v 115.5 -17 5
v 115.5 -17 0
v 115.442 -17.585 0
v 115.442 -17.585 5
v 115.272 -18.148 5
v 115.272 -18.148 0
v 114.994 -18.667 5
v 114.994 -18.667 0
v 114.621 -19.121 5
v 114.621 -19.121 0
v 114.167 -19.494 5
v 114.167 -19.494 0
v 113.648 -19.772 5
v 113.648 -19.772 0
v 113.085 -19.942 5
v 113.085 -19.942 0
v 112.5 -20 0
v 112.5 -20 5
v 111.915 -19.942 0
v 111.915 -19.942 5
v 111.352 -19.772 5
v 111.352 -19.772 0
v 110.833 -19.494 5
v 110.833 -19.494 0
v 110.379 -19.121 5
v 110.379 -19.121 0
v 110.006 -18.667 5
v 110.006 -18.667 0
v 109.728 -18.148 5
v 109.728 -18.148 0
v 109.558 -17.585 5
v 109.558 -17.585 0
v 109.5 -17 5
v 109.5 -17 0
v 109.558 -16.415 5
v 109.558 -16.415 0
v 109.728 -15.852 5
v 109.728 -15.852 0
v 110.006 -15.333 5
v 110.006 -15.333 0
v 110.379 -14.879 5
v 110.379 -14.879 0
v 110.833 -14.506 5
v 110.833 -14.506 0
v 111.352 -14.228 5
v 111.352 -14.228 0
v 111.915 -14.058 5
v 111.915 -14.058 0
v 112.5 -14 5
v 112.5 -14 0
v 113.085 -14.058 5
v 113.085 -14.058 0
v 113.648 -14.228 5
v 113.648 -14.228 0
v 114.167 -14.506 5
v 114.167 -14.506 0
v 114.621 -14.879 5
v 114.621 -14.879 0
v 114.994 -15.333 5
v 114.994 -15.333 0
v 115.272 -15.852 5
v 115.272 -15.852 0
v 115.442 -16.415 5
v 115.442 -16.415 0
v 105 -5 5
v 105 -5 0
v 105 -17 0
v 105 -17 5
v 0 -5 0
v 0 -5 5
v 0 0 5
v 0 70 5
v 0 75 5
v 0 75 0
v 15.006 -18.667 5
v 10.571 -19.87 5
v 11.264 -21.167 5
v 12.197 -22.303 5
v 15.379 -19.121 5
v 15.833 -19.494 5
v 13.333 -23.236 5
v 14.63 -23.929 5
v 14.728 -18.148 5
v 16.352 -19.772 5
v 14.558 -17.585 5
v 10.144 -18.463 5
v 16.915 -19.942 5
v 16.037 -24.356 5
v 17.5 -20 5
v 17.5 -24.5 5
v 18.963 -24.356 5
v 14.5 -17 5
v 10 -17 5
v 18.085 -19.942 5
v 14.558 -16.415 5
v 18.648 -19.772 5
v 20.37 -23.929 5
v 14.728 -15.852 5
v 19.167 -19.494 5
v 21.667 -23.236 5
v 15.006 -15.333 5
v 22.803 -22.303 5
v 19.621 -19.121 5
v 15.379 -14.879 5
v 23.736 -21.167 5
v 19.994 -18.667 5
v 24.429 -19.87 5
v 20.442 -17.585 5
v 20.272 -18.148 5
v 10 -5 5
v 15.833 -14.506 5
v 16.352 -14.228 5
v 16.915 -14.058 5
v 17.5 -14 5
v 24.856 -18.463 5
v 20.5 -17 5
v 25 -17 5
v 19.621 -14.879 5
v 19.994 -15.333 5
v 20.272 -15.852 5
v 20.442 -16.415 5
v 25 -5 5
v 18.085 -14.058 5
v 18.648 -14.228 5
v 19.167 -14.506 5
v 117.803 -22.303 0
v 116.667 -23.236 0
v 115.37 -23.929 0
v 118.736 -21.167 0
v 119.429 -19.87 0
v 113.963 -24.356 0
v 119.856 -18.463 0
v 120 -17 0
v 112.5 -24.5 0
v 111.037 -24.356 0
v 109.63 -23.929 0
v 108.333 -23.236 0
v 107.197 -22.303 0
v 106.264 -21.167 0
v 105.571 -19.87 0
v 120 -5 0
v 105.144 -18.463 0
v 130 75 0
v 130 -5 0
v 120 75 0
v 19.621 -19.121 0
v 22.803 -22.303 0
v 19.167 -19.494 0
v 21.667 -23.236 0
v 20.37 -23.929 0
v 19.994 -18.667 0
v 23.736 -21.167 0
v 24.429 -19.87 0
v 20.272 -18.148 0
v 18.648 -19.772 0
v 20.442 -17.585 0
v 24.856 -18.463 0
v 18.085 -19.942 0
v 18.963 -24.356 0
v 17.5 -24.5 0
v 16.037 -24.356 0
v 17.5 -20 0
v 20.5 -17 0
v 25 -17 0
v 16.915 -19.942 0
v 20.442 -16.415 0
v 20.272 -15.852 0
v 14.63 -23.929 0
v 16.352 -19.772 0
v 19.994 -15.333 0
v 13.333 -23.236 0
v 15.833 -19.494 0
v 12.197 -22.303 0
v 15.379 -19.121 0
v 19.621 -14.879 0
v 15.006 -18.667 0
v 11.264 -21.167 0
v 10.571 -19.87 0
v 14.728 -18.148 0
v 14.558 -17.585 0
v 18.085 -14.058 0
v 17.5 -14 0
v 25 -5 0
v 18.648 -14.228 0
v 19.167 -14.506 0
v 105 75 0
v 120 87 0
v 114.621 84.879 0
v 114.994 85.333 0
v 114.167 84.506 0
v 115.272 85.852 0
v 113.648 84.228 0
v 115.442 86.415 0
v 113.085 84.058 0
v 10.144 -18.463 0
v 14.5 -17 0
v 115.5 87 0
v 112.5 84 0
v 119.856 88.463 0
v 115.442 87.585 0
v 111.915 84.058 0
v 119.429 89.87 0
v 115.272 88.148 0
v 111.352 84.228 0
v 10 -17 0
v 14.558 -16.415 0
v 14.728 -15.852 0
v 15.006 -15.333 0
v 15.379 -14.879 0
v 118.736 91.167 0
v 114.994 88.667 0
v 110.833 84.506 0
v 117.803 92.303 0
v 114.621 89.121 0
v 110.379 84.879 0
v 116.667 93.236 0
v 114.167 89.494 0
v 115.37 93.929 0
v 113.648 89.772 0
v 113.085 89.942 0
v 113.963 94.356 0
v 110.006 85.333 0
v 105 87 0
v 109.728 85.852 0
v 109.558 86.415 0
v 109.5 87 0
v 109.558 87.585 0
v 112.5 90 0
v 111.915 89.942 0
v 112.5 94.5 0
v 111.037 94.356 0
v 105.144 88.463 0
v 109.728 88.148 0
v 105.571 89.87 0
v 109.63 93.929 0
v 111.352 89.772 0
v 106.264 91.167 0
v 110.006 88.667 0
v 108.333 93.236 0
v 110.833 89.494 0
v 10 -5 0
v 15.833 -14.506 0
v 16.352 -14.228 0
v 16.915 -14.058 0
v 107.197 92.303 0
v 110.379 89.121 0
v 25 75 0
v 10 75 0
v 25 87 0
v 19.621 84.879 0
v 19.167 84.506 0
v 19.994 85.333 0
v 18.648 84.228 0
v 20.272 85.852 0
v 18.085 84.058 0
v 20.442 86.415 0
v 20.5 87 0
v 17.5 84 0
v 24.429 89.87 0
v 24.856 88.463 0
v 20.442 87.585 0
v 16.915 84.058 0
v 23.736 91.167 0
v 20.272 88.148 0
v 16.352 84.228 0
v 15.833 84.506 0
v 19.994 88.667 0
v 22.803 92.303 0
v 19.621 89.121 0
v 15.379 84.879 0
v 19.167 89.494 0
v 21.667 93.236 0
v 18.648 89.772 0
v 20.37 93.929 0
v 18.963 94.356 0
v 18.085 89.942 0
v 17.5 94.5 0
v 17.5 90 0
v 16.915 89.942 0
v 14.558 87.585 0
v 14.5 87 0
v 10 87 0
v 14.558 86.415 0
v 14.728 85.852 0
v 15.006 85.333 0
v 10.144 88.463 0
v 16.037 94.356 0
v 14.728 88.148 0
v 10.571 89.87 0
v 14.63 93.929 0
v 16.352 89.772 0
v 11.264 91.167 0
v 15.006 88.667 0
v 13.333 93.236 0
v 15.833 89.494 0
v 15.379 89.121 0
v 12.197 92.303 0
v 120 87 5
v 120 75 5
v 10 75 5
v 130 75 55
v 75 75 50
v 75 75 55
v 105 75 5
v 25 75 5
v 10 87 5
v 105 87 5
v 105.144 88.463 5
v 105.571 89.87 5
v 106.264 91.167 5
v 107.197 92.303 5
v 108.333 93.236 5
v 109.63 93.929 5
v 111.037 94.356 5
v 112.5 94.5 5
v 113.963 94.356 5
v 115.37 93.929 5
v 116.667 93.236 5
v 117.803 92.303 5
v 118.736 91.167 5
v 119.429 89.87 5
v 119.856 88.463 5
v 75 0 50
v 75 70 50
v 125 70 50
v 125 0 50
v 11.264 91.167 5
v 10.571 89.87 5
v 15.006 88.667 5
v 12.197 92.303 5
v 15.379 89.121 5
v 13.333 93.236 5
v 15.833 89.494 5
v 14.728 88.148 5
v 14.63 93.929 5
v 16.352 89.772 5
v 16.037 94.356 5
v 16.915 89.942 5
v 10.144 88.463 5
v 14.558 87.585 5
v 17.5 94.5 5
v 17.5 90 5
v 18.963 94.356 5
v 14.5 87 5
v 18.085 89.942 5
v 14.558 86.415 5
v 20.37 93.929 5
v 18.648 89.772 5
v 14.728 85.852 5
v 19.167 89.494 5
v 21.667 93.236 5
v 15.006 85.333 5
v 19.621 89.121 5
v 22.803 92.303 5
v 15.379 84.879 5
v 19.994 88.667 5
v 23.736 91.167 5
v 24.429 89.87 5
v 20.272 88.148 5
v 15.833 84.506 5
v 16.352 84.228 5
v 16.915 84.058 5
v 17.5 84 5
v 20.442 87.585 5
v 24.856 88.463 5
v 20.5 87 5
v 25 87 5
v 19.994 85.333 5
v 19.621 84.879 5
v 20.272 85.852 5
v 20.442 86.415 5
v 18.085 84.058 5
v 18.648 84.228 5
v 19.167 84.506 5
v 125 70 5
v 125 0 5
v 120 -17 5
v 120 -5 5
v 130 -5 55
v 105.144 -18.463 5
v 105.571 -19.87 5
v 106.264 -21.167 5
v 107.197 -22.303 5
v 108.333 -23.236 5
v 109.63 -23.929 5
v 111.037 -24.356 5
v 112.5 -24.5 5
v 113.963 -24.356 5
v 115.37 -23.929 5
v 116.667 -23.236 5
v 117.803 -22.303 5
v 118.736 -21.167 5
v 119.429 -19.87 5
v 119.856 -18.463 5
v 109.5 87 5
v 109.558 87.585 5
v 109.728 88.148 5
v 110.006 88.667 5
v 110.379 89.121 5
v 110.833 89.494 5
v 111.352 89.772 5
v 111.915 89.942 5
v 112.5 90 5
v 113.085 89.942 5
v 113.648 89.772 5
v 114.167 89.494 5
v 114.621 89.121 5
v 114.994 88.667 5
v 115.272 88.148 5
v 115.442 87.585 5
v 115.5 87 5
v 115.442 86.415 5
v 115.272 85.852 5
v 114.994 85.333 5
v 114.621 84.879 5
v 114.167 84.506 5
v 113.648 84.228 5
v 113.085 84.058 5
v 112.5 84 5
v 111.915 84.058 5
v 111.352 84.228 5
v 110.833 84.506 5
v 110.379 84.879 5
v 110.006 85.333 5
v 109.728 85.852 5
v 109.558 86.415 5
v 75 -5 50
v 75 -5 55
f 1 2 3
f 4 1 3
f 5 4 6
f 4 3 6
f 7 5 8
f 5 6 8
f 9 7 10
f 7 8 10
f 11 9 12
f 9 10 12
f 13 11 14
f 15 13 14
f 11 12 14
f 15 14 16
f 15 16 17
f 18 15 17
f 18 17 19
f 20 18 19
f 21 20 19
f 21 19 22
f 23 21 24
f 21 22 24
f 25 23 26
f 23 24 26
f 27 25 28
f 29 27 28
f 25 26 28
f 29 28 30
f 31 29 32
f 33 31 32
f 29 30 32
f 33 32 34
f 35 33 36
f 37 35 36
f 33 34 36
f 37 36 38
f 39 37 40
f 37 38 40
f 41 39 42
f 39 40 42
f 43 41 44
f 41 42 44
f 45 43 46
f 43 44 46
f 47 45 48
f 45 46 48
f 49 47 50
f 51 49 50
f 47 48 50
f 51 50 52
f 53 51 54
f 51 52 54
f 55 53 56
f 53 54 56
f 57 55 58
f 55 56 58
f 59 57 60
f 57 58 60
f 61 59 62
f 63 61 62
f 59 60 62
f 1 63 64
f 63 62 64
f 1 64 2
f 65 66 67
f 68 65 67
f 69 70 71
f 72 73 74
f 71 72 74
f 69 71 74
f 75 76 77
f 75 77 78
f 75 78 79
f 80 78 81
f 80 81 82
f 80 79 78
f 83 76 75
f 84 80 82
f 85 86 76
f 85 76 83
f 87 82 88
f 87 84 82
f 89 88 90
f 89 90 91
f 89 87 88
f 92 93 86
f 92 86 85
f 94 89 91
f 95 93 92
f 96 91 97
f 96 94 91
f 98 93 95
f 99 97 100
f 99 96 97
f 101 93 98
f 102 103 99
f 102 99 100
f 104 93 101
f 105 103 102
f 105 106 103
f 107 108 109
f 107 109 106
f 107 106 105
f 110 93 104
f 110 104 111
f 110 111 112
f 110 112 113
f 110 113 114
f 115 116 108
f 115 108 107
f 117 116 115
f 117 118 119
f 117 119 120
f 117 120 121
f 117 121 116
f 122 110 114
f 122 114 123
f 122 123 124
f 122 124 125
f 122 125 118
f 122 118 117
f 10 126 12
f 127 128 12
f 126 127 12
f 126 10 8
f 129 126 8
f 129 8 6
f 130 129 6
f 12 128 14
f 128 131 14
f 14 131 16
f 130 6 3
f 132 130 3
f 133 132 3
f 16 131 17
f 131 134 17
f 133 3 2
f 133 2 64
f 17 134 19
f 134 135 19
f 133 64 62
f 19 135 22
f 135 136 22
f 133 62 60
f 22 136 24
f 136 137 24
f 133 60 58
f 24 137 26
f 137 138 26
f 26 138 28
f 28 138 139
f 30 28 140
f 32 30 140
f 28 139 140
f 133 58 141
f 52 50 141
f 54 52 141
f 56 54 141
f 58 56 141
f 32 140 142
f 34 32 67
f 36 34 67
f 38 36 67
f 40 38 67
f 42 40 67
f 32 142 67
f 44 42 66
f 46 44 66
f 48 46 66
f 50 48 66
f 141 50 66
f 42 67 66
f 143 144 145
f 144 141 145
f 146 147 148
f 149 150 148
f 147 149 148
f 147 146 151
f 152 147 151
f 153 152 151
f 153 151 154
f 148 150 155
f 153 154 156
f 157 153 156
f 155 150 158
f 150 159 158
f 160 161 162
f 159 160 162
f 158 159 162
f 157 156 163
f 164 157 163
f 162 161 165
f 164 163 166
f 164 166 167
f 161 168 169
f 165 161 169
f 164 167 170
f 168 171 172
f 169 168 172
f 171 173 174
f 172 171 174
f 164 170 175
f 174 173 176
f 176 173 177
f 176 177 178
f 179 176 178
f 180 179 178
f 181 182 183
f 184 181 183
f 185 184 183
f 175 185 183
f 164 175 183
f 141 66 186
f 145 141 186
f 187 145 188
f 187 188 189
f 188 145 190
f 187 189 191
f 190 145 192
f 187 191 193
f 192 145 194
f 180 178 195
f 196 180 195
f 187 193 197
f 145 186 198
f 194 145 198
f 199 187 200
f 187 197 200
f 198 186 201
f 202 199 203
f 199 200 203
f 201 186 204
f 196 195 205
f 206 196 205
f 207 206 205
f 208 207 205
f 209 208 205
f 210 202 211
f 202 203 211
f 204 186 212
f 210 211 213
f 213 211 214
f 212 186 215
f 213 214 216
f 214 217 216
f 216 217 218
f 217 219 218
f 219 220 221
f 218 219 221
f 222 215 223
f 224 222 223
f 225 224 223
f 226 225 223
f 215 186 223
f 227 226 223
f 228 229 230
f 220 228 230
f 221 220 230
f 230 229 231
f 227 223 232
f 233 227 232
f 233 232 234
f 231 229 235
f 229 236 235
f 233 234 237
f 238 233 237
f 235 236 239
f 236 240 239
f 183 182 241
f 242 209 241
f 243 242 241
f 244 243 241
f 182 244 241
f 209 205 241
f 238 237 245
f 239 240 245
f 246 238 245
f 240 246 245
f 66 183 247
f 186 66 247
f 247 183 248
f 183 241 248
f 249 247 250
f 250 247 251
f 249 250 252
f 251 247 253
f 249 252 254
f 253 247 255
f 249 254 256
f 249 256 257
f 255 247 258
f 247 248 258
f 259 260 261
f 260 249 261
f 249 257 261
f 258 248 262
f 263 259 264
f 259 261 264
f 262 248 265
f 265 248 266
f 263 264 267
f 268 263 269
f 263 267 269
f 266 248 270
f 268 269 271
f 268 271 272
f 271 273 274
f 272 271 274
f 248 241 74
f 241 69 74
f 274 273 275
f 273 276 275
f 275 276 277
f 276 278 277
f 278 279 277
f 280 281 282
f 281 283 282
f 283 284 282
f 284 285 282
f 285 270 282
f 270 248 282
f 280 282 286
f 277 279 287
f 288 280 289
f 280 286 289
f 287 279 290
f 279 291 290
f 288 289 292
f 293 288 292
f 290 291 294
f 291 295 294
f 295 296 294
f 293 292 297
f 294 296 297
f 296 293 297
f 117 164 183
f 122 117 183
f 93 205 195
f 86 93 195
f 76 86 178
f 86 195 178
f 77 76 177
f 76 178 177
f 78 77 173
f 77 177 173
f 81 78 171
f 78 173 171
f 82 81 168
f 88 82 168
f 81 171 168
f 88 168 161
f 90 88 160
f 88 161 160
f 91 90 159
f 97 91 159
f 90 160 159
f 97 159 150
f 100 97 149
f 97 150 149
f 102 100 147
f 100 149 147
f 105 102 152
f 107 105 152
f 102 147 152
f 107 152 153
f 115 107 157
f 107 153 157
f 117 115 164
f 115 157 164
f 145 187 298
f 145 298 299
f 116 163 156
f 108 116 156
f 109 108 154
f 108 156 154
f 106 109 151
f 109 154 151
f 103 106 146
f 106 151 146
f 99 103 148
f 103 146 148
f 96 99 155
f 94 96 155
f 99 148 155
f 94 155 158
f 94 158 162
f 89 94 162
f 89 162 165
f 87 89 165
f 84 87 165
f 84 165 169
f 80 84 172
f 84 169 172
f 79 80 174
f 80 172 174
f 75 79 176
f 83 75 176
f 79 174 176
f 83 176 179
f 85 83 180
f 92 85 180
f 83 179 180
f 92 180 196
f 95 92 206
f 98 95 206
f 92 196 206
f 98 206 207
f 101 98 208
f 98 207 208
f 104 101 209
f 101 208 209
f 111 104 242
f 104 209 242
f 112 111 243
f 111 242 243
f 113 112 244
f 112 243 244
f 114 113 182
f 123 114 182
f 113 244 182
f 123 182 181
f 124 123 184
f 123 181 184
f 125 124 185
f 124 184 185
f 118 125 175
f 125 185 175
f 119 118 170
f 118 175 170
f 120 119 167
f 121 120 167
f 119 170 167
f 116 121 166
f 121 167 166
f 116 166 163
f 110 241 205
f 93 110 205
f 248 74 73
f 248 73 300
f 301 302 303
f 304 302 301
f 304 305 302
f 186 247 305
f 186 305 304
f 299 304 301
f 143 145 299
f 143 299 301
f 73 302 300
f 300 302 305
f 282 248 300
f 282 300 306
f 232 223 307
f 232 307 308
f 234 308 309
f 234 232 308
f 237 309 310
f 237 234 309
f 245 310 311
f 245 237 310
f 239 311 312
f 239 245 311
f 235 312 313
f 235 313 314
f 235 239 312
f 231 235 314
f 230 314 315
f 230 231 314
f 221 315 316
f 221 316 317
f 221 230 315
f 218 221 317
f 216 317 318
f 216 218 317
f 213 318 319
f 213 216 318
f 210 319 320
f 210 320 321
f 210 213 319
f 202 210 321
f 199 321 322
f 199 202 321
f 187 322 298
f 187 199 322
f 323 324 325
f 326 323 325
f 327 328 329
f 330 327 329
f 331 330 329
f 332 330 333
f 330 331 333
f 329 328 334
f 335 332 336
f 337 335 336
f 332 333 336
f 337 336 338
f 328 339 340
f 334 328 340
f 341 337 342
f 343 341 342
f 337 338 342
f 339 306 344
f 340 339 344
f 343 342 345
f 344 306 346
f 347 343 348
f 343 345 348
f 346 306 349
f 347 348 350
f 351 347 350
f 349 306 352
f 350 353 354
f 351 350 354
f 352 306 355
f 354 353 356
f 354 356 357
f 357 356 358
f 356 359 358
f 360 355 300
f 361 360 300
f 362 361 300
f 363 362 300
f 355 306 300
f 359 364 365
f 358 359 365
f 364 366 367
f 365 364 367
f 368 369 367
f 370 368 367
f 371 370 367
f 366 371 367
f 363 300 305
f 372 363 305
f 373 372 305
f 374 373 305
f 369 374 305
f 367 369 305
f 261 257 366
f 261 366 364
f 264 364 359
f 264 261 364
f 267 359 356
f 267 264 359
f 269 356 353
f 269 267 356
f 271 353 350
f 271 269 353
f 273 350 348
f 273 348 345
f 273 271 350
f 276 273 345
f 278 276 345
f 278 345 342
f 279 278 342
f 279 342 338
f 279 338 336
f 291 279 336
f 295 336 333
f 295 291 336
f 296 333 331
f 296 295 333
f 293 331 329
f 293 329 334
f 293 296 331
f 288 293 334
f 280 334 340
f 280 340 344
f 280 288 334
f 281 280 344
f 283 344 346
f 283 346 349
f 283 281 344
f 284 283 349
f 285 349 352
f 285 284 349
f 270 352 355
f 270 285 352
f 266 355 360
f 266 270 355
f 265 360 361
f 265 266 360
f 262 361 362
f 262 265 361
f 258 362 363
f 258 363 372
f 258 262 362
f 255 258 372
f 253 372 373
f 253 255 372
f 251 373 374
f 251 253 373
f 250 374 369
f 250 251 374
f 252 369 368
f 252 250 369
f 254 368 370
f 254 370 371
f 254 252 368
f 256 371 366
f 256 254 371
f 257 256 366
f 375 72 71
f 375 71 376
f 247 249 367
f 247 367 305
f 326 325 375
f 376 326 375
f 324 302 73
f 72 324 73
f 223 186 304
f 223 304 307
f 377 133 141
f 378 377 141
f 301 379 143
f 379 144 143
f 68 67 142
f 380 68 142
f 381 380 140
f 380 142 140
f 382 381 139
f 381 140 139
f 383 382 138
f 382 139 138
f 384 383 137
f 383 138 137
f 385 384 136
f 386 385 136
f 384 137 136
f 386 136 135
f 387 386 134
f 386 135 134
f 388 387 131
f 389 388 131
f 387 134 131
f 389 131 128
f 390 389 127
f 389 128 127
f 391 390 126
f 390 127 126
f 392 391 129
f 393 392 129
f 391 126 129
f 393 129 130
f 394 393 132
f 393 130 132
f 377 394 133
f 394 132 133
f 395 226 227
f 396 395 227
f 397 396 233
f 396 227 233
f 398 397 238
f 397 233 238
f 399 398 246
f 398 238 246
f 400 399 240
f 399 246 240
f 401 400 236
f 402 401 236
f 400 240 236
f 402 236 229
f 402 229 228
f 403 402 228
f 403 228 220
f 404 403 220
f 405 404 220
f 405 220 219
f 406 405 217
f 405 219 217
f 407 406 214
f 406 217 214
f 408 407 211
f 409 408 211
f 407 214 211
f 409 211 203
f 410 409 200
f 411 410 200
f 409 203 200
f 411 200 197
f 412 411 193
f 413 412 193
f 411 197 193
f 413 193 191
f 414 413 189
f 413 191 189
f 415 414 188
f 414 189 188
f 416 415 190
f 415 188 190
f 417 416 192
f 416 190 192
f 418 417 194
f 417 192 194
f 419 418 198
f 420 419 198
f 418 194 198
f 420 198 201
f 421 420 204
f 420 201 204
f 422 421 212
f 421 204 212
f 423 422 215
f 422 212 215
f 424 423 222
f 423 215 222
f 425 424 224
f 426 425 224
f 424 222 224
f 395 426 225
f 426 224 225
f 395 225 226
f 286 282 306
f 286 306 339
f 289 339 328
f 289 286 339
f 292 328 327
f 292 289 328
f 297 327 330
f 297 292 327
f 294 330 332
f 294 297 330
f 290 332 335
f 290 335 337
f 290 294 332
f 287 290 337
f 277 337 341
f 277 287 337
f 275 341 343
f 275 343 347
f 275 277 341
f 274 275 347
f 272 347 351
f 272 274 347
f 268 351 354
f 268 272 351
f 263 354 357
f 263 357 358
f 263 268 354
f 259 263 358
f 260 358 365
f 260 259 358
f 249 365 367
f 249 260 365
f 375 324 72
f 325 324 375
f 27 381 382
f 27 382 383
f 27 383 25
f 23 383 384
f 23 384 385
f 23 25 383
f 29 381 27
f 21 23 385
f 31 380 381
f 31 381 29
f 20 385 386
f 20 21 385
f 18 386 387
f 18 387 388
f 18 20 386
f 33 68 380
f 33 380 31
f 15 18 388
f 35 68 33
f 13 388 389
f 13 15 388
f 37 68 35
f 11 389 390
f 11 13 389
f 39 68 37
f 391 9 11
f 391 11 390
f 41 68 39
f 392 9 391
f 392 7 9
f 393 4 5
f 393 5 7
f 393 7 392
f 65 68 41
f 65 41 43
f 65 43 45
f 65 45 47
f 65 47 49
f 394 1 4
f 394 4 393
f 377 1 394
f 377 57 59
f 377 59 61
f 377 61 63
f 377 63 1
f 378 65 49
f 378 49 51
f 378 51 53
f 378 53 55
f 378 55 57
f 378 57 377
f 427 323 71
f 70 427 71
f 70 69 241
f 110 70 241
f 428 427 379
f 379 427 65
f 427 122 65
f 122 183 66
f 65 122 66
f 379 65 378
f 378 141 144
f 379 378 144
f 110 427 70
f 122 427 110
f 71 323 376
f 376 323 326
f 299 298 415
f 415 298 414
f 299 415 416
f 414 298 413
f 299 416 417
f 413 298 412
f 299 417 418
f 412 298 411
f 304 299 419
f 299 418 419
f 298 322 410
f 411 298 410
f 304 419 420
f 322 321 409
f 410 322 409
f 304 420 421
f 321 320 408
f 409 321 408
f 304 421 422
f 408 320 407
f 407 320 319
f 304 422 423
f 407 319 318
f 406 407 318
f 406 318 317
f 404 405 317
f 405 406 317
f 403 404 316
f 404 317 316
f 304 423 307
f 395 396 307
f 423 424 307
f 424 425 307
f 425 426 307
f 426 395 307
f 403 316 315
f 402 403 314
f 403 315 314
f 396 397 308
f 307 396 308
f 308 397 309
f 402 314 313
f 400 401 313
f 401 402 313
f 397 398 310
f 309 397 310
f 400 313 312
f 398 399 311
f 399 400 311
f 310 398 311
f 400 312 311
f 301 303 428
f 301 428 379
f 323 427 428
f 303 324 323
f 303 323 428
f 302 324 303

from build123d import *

# Parameters (mm, degrees)
SKETCH_1_W             = 125
SKETCH_1_H             = 70
EXTRUDE_1_DEPTH        = 5
EXTRUDE_2_DEPTH        = 5
PATTERN_LINEAR_1_COUNT = 2
PATTERN_LINEAR_1_PITCH = 75
SKETCH_4_W             = 50
SKETCH_4_H             = 80
EXTRUDE_3_DEPTH        = 5
SKETCH_5_W             = 55
SKETCH_5_H             = 80
EXTRUDE_4_DEPTH        = 5
EXTRUDE_5_DEPTH        = 5
PATTERN_LINEAR_2_COUNT = 2
PATTERN_LINEAR_2_PITCH = 95
MIRROR_1_COPY_1_DEPTH  = 5


with BuildPart() as part:
    # 草圖1 → 填料-伸長1 (new body)
    with BuildSketch(Plane.XY):
        with Locations((62.5, 35)):
            Rectangle(SKETCH_1_W, SKETCH_1_H)
    extrude(amount=EXTRUDE_1_DEPTH)

    # 草圖2 → 填料-伸長2 (add)
    with BuildSketch(Plane.XZ):
        Polygon((75, 50), (0, 5), (0, 0), (125, 0), (125, 50), align=None)
    extrude_2 = extrude(amount=EXTRUDE_2_DEPTH)

    # 直線複製排列1: 填料-伸長2 ×2
    with Locations(*[(0, i * PATTERN_LINEAR_1_PITCH, 0) for i in range(1, PATTERN_LINEAR_1_COUNT)]):
        add(extrude_2)

    # 草圖4 → 填料-伸長3 (add)
    with BuildSketch(Plane(origin=(125, 0, 0), x_dir=(0, 0, -1), z_dir=(1, 0, 0))):
        with Locations((-25, 35)):
            Rectangle(SKETCH_4_W, SKETCH_4_H)
    extrude(amount=EXTRUDE_3_DEPTH)

    # 草圖5 → 填料-伸長4 (add)
    with BuildSketch(Plane.XY.offset(50)):
        with Locations((102.5, 35)):
            Rectangle(SKETCH_5_W, SKETCH_5_H)
    extrude(amount=EXTRUDE_4_DEPTH)

    # 草圖6 → 填料-伸長5 (add)
    with BuildSketch(Plane.XY):
        with BuildLine():
            Line((25, -5), (10, -5))
            Line((10, -5), (10, -17))
            ThreePointArc((10, -17), (17.5, -9.5), (25, -17))
            Line((25, -17), (25, -5))
        make_face()
        with BuildLine():
            ThreePointArc((25, -17), (17.5, -9.5), (10, -17))
            Line((10, -17), (14.5, -17))
            ThreePointArc((14.5, -17), (17.5, -14), (20.5, -17))
            Line((20.5, -17), (25, -17))
        make_face()
        with BuildLine():
            Line((14.5, -17), (10, -17))
            ThreePointArc((10, -17), (17.5, -24.5), (25, -17))
            Line((25, -17), (20.5, -17))
            ThreePointArc((20.5, -17), (17.5, -20), (14.5, -17))
        make_face()
    extrude_5 = extrude(amount=EXTRUDE_5_DEPTH)

    # 直線複製排列2: 填料-伸長5 ×2
    with Locations(*[(i * PATTERN_LINEAR_2_PITCH, 0, 0) for i in range(1, PATTERN_LINEAR_2_COUNT)]):
        add(extrude_5)

    # 鏡射1: 填料-伸長5 across plane
    add(extrude_5.mirror(Plane.ZX.offset(35)))

    # 鏡射1 copy 1 sketch → 鏡射1 copy 1 (add)
    with BuildSketch(Plane(origin=(95, 70, 0), x_dir=(1, 0, 0), z_dir=(0, 0, 1))):
        with BuildLine():
            Line((25, 5), (10, 5))
            Line((10, 5), (10, 17))
            ThreePointArc((10, 17), (17.5, 9.5), (25, 17))
            Line((25, 17), (25, 5))
        make_face()
        with BuildLine():
            ThreePointArc((25, 17), (17.5, 9.5), (10, 17))
            Line((10, 17), (14.5, 17))
            ThreePointArc((14.5, 17), (17.5, 14), (20.5, 17))
            Line((20.5, 17), (25, 17))
        make_face()
        with BuildLine():
            Line((14.5, 17), (10, 17))
            ThreePointArc((10, 17), (17.5, 24.5), (25, 17))
            Line((25, 17), (20.5, 17))
            ThreePointArc((20.5, 17), (17.5, 20), (14.5, 17))
        make_face()
    extrude(amount=MIRROR_1_COPY_1_DEPTH)


solid = part.part
